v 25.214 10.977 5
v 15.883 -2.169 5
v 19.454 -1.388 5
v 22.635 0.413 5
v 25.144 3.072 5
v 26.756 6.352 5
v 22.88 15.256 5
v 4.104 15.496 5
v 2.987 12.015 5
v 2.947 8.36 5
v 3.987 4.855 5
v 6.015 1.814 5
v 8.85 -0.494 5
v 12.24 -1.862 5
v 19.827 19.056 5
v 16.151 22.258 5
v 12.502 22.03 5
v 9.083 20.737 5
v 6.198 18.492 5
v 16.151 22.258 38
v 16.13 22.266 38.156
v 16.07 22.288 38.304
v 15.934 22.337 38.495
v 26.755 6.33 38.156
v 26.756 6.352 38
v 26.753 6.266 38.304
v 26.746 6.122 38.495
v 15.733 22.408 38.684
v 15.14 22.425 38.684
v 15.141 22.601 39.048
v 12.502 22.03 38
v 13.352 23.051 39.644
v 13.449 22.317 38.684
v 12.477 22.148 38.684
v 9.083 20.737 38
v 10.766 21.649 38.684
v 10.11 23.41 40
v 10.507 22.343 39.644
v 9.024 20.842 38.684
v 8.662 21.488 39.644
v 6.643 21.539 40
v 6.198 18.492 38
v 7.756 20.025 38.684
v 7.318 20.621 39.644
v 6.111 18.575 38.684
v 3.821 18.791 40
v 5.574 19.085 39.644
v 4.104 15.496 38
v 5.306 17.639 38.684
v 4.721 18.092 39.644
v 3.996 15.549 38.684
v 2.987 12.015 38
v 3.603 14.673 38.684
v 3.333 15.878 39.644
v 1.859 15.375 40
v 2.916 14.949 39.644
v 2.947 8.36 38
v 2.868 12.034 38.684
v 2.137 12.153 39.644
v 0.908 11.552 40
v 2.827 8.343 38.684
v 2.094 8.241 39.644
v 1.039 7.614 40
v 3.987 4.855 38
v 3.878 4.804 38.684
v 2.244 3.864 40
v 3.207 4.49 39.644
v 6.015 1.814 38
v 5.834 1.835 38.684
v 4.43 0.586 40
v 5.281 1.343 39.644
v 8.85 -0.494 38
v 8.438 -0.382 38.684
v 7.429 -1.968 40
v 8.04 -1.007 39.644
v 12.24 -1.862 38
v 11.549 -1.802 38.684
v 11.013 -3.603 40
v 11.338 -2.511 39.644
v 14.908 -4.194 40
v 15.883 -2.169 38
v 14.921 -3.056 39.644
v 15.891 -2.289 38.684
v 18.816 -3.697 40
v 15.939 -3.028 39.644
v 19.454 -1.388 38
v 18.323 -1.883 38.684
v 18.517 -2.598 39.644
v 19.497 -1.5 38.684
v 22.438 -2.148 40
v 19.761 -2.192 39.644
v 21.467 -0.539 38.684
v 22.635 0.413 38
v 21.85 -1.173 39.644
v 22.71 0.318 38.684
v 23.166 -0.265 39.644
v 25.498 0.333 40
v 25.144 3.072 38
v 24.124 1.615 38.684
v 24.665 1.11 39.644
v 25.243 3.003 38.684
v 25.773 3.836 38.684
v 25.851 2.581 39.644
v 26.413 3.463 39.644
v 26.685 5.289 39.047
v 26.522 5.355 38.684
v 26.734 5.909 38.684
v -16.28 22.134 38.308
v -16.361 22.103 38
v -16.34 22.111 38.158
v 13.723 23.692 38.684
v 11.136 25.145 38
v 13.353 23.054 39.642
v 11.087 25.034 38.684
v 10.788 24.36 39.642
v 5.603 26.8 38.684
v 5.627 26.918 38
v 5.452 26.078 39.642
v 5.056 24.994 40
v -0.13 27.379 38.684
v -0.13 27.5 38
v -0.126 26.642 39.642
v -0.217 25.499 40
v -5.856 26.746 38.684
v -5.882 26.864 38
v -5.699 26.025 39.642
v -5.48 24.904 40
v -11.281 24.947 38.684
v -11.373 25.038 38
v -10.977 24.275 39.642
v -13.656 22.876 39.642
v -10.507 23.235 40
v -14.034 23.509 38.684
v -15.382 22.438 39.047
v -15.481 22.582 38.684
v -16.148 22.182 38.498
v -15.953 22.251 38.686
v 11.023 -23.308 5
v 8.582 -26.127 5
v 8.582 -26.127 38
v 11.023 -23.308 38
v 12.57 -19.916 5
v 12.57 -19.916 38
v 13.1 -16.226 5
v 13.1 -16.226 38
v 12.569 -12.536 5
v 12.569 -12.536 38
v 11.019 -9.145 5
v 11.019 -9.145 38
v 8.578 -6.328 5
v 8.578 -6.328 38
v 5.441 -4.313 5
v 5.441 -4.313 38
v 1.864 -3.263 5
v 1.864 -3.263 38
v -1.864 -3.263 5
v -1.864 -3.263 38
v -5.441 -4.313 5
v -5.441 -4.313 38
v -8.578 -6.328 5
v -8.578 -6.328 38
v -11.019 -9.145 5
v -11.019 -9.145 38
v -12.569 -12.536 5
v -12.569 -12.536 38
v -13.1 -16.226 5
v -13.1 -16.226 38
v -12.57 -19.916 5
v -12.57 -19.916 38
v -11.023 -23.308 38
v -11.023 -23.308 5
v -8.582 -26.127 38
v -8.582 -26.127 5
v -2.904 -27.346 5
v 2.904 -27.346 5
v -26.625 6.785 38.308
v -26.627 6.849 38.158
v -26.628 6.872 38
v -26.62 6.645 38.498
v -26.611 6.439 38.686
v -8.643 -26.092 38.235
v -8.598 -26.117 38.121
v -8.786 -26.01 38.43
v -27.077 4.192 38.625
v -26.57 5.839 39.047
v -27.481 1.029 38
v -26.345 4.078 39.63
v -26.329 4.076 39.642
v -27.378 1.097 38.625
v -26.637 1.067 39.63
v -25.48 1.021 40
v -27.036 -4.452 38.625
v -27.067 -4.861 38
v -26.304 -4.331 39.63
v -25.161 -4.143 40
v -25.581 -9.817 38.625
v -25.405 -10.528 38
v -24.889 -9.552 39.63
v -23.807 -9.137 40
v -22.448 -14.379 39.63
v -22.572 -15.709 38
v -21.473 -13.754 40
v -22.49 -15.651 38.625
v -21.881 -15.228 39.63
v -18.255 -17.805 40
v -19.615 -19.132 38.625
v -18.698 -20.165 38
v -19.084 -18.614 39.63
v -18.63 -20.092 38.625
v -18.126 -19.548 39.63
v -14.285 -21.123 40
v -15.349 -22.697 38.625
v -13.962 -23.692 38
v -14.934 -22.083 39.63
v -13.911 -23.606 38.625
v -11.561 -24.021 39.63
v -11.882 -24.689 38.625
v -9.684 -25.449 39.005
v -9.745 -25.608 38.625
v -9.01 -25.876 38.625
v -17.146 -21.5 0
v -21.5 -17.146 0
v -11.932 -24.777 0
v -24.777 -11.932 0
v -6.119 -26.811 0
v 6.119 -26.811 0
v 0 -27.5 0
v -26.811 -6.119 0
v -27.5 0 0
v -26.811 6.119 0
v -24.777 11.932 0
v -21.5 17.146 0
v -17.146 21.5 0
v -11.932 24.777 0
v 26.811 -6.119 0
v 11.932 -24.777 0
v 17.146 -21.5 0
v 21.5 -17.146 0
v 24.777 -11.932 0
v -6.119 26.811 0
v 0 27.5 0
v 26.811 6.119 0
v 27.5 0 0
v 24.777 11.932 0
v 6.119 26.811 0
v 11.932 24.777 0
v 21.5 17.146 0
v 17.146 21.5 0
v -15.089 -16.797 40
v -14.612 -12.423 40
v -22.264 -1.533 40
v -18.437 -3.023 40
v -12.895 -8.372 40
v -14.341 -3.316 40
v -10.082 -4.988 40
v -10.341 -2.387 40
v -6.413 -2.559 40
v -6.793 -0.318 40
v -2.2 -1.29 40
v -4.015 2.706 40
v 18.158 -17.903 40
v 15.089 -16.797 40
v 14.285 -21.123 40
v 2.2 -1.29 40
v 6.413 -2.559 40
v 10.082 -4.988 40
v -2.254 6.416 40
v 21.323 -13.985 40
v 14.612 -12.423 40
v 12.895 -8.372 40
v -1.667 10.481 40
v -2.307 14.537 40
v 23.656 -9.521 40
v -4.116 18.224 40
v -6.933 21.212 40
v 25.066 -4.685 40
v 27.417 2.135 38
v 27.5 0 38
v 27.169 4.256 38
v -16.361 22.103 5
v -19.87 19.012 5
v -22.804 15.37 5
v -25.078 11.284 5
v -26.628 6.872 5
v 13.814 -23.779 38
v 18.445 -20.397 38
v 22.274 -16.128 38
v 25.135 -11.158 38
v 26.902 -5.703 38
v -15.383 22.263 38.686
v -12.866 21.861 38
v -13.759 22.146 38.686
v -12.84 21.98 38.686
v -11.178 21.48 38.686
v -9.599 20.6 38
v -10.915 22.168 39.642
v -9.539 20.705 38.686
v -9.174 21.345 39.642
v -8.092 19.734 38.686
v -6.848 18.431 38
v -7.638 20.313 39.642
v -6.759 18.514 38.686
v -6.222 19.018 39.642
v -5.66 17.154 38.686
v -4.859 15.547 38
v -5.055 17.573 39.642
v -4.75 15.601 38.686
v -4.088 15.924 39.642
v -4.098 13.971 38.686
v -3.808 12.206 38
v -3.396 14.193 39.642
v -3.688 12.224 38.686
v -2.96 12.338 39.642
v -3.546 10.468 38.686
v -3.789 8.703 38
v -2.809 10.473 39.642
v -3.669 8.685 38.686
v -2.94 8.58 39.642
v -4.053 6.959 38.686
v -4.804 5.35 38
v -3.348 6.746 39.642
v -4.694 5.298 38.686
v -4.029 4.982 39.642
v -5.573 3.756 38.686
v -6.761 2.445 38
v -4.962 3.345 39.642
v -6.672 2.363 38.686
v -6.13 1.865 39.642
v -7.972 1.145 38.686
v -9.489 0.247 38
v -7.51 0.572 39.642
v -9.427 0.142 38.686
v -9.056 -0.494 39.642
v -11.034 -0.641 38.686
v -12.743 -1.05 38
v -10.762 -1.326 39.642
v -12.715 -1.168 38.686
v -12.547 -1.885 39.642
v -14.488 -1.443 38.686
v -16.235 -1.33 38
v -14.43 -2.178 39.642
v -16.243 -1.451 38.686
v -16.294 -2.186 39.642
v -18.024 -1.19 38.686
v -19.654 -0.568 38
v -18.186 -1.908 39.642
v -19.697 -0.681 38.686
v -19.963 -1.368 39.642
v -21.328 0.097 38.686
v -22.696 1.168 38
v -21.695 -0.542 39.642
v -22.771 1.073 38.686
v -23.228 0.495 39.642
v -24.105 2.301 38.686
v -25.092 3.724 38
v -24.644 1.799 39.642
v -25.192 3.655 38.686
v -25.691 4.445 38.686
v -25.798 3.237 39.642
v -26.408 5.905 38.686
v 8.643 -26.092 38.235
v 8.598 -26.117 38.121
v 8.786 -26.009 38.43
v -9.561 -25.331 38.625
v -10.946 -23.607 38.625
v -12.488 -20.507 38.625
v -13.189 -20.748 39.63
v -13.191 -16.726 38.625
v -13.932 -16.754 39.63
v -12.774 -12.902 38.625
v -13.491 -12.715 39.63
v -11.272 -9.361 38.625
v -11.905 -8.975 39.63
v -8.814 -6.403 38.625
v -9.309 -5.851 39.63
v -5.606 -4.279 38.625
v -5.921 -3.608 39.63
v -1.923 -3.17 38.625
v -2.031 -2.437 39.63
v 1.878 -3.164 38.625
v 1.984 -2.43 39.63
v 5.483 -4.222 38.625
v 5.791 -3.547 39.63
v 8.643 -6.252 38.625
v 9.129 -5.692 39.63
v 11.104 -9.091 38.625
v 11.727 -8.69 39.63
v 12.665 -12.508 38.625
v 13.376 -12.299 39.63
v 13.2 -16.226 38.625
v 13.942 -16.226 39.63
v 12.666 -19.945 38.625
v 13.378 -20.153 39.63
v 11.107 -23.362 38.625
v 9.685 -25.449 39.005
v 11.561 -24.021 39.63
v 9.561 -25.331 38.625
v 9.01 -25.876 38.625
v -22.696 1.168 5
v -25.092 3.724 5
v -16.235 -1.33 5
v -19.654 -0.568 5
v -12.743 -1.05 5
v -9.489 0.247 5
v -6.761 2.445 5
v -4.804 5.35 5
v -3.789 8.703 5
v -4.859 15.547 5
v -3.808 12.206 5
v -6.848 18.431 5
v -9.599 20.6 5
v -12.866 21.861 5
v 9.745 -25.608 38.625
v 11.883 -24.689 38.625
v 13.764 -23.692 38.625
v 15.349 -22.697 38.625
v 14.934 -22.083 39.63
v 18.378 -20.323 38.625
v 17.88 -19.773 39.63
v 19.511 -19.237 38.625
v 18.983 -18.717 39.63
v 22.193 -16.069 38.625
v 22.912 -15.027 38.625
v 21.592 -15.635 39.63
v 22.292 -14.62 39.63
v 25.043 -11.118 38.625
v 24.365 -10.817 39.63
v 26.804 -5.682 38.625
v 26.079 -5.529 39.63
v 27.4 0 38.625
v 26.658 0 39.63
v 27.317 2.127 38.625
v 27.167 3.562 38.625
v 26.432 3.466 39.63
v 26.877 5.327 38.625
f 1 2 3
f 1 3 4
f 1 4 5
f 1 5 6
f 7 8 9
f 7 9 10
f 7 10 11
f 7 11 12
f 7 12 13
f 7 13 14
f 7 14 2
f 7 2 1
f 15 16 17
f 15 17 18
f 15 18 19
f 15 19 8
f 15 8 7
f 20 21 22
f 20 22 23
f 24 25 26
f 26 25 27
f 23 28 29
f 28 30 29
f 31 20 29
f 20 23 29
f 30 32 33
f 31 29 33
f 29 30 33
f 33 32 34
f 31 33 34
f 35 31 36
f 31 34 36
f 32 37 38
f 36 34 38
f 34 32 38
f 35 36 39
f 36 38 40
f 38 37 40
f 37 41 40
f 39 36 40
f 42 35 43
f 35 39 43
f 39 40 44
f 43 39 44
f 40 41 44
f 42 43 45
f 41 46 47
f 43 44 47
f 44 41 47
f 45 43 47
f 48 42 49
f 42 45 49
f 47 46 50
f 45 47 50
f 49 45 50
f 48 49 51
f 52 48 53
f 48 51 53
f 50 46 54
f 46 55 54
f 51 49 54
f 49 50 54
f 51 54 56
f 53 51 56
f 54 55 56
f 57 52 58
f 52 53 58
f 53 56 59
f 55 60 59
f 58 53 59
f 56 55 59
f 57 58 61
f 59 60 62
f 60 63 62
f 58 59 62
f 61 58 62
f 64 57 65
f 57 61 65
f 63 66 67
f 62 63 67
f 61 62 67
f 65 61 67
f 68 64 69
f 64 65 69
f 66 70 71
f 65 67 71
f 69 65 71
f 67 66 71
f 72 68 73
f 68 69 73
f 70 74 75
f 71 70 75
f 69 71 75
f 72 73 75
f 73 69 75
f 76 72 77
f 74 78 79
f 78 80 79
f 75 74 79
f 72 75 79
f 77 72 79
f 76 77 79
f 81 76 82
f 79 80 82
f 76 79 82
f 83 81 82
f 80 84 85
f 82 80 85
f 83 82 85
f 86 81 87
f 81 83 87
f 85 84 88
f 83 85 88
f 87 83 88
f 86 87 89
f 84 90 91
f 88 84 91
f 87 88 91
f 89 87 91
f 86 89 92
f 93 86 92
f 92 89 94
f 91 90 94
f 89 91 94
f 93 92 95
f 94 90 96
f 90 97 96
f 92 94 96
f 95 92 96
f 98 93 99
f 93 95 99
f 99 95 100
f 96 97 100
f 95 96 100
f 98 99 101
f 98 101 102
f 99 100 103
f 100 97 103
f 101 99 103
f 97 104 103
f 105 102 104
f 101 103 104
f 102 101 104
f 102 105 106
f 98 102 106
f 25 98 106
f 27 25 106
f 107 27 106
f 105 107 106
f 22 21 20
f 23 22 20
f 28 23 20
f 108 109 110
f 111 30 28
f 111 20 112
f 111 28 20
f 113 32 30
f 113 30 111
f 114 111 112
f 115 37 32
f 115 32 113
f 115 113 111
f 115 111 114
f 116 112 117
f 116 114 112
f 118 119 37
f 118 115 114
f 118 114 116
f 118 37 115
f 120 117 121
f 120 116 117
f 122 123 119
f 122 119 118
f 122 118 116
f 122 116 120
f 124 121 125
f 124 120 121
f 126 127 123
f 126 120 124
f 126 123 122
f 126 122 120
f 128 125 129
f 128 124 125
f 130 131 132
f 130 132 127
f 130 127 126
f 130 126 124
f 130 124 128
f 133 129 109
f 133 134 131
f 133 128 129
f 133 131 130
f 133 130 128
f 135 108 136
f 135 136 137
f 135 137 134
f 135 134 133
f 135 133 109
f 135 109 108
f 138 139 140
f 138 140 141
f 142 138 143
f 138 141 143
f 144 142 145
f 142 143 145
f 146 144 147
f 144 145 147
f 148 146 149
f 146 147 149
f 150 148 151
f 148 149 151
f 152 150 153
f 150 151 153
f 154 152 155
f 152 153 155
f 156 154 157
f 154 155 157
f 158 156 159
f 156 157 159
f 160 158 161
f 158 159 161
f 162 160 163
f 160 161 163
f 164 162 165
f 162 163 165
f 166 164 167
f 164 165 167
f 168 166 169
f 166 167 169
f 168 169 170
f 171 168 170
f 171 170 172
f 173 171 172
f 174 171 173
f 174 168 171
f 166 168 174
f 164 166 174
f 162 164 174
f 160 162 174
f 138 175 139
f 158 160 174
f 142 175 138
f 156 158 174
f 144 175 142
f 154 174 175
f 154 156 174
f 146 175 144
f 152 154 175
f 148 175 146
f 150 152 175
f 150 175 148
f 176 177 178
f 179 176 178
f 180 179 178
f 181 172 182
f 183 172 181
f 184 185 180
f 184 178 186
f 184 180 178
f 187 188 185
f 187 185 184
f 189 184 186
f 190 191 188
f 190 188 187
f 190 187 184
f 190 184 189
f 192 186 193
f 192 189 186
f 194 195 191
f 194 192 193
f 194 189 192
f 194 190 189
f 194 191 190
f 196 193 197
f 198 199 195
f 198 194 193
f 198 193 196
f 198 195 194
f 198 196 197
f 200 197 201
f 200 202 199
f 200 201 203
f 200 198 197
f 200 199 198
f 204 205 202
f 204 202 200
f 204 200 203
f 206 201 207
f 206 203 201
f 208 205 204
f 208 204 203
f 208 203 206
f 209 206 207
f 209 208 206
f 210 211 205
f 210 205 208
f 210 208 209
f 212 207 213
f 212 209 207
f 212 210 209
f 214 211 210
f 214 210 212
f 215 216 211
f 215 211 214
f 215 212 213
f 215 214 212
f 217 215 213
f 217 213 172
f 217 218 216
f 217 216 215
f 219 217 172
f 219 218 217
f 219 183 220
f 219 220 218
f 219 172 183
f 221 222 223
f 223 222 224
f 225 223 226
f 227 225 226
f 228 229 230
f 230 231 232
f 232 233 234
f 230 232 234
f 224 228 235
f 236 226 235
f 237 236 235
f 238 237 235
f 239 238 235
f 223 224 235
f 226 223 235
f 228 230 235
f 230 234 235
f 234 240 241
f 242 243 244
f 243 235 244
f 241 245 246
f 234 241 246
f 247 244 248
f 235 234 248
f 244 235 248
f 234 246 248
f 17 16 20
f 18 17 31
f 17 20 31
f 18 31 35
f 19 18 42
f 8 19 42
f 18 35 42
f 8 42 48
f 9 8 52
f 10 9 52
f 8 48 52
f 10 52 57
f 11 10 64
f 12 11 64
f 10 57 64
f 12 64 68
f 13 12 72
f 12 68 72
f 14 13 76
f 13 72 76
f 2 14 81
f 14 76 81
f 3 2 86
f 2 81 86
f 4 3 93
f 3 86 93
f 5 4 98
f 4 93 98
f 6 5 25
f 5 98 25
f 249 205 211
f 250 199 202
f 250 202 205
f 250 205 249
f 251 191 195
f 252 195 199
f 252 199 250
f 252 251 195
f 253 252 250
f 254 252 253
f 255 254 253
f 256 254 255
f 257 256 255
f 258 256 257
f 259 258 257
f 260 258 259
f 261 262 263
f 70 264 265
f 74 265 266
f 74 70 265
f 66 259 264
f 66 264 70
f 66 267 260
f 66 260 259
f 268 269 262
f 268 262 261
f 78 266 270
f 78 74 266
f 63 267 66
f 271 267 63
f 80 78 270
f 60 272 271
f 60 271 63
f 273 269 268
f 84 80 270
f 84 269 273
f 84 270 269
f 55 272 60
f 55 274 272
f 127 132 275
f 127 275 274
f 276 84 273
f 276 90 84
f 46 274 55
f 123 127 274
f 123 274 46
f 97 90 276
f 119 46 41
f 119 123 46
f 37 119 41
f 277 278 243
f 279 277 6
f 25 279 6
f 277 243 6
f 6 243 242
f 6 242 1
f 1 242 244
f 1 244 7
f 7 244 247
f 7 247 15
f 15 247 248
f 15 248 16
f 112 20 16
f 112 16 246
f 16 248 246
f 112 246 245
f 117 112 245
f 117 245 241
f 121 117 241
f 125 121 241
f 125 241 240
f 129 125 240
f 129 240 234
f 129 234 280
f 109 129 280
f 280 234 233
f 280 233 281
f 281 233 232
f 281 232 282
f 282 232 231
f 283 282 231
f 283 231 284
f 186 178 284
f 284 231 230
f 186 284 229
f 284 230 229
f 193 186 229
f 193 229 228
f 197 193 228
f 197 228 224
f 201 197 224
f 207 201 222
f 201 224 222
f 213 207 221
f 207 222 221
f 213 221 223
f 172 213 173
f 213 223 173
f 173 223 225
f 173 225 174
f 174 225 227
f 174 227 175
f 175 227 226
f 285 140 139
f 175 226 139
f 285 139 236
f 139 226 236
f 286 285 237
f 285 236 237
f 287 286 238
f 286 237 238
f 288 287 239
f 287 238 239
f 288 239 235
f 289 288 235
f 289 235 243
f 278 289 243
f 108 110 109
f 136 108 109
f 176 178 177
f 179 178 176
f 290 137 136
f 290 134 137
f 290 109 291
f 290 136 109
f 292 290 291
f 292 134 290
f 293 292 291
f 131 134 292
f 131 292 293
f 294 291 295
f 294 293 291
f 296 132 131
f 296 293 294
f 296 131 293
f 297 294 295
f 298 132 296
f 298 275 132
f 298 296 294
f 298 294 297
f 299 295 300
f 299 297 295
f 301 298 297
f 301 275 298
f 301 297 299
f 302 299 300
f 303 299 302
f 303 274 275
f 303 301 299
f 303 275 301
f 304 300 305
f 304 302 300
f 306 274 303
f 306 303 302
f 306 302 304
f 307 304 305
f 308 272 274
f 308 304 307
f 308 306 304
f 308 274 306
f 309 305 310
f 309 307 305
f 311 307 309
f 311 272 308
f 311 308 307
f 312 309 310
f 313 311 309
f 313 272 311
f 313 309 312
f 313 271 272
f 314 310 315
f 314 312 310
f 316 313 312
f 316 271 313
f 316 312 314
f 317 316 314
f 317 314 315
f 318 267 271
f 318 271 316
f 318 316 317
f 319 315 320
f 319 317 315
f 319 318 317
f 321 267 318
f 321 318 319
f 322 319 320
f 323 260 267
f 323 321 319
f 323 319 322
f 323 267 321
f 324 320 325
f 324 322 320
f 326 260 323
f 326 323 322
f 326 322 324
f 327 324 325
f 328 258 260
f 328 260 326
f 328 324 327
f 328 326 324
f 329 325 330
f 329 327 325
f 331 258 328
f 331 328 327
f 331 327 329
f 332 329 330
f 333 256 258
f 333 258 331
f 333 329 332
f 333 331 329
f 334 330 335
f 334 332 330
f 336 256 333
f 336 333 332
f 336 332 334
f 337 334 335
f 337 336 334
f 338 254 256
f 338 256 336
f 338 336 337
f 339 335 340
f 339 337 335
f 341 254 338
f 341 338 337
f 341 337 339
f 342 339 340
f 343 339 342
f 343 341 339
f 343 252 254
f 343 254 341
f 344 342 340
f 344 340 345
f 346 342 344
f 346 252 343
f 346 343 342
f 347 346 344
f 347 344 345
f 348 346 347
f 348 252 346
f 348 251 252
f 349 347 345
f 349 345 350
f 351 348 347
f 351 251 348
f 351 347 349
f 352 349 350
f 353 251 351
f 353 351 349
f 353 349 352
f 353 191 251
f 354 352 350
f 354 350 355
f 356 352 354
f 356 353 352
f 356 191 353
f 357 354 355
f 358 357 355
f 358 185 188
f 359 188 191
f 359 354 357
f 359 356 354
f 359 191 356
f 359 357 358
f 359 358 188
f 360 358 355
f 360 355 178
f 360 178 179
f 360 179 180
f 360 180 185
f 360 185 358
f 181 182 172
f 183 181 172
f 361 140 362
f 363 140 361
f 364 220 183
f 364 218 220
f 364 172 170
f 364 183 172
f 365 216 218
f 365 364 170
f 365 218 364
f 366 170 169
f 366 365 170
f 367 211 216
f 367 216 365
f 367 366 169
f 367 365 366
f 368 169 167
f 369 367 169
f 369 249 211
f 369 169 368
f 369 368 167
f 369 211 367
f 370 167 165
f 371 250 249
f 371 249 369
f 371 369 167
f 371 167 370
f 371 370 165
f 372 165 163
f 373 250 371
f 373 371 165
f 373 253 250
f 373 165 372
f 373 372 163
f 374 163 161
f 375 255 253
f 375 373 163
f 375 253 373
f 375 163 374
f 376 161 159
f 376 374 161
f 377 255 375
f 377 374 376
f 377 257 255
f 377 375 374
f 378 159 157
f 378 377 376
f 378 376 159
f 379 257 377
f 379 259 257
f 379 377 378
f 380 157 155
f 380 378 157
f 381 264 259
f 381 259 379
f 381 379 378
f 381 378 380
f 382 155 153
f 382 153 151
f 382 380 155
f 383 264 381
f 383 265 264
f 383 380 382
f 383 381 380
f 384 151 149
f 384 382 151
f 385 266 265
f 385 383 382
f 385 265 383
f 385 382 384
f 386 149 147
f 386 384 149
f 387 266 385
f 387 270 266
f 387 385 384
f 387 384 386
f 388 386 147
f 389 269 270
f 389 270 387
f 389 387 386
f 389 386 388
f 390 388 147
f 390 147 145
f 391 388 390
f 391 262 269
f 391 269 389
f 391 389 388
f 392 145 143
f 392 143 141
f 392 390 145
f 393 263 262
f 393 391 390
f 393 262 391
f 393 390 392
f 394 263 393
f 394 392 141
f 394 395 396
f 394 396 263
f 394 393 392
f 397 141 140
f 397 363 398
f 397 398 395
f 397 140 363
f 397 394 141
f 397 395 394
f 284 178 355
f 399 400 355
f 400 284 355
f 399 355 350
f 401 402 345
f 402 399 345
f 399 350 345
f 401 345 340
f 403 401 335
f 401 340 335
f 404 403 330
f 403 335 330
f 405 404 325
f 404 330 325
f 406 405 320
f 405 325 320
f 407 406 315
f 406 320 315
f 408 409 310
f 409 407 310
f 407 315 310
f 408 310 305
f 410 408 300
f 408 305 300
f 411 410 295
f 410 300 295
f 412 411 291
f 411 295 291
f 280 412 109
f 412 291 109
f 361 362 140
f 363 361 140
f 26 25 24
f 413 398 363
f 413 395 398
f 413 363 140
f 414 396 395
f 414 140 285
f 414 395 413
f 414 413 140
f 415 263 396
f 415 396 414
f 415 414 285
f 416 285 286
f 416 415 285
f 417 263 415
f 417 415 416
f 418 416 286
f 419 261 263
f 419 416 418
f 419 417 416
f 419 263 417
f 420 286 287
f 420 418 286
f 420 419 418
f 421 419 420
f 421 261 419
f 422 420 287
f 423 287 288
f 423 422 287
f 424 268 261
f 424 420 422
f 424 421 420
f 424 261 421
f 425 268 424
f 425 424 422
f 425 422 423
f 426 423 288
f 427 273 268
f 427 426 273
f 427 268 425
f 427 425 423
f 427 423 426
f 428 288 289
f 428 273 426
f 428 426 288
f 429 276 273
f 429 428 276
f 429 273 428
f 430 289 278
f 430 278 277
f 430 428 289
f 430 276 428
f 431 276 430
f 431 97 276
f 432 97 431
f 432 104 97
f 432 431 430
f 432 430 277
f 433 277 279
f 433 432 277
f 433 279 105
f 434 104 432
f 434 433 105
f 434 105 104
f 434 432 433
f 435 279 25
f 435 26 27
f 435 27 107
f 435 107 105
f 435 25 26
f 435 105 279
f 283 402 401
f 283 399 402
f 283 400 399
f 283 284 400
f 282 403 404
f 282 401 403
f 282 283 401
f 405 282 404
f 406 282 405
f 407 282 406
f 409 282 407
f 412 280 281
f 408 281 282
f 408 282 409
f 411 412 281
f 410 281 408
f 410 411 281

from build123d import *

# Parameters (mm, degrees)
F0_R     = 27.5
F1_DEPTH = 40
F3_R     = 11.75
F3_R_2   = 12.25
F3_R_3   = 13.1
F4_DEPTH = 35
F5_R     = 2


with BuildPart() as f1:
    # F0 (on Top) → F1 (new body)
    with BuildSketch(Plane.XY):
        Circle(F0_R)
    extrude(amount=F1_DEPTH)

    # F3 (on face) → F4 (cut, through all)
    with BuildSketch(Plane.XY.offset(40)):
        with Locations((-15.416977, 10.391477)):
            Circle(F3_R)
        with Locations((15.079009, 10.054506)):
            Circle(F3_R_2)
        with Locations((0, -16.229328)):
            Circle(F3_R_3)
    extrude(amount=-F4_DEPTH, mode=Mode.SUBTRACT)

    # F5
    f5_edges = [f1.edges().sort_by_distance(p)[0] for p in [
        (22.274014, -16.128183, 40),
        (27.313425, 3.197938, 40),
        (4.886965, 3.258571, 40),
        (-0.130285, 27.499691, 40),
        (-5.673617, 3.824178, 40),
        (-24.127977, -13.194345, 40),
        (0, -3.129328, 40),
    ]]
    fillet(f5_edges, radius=F5_R)


solid = f1.part
